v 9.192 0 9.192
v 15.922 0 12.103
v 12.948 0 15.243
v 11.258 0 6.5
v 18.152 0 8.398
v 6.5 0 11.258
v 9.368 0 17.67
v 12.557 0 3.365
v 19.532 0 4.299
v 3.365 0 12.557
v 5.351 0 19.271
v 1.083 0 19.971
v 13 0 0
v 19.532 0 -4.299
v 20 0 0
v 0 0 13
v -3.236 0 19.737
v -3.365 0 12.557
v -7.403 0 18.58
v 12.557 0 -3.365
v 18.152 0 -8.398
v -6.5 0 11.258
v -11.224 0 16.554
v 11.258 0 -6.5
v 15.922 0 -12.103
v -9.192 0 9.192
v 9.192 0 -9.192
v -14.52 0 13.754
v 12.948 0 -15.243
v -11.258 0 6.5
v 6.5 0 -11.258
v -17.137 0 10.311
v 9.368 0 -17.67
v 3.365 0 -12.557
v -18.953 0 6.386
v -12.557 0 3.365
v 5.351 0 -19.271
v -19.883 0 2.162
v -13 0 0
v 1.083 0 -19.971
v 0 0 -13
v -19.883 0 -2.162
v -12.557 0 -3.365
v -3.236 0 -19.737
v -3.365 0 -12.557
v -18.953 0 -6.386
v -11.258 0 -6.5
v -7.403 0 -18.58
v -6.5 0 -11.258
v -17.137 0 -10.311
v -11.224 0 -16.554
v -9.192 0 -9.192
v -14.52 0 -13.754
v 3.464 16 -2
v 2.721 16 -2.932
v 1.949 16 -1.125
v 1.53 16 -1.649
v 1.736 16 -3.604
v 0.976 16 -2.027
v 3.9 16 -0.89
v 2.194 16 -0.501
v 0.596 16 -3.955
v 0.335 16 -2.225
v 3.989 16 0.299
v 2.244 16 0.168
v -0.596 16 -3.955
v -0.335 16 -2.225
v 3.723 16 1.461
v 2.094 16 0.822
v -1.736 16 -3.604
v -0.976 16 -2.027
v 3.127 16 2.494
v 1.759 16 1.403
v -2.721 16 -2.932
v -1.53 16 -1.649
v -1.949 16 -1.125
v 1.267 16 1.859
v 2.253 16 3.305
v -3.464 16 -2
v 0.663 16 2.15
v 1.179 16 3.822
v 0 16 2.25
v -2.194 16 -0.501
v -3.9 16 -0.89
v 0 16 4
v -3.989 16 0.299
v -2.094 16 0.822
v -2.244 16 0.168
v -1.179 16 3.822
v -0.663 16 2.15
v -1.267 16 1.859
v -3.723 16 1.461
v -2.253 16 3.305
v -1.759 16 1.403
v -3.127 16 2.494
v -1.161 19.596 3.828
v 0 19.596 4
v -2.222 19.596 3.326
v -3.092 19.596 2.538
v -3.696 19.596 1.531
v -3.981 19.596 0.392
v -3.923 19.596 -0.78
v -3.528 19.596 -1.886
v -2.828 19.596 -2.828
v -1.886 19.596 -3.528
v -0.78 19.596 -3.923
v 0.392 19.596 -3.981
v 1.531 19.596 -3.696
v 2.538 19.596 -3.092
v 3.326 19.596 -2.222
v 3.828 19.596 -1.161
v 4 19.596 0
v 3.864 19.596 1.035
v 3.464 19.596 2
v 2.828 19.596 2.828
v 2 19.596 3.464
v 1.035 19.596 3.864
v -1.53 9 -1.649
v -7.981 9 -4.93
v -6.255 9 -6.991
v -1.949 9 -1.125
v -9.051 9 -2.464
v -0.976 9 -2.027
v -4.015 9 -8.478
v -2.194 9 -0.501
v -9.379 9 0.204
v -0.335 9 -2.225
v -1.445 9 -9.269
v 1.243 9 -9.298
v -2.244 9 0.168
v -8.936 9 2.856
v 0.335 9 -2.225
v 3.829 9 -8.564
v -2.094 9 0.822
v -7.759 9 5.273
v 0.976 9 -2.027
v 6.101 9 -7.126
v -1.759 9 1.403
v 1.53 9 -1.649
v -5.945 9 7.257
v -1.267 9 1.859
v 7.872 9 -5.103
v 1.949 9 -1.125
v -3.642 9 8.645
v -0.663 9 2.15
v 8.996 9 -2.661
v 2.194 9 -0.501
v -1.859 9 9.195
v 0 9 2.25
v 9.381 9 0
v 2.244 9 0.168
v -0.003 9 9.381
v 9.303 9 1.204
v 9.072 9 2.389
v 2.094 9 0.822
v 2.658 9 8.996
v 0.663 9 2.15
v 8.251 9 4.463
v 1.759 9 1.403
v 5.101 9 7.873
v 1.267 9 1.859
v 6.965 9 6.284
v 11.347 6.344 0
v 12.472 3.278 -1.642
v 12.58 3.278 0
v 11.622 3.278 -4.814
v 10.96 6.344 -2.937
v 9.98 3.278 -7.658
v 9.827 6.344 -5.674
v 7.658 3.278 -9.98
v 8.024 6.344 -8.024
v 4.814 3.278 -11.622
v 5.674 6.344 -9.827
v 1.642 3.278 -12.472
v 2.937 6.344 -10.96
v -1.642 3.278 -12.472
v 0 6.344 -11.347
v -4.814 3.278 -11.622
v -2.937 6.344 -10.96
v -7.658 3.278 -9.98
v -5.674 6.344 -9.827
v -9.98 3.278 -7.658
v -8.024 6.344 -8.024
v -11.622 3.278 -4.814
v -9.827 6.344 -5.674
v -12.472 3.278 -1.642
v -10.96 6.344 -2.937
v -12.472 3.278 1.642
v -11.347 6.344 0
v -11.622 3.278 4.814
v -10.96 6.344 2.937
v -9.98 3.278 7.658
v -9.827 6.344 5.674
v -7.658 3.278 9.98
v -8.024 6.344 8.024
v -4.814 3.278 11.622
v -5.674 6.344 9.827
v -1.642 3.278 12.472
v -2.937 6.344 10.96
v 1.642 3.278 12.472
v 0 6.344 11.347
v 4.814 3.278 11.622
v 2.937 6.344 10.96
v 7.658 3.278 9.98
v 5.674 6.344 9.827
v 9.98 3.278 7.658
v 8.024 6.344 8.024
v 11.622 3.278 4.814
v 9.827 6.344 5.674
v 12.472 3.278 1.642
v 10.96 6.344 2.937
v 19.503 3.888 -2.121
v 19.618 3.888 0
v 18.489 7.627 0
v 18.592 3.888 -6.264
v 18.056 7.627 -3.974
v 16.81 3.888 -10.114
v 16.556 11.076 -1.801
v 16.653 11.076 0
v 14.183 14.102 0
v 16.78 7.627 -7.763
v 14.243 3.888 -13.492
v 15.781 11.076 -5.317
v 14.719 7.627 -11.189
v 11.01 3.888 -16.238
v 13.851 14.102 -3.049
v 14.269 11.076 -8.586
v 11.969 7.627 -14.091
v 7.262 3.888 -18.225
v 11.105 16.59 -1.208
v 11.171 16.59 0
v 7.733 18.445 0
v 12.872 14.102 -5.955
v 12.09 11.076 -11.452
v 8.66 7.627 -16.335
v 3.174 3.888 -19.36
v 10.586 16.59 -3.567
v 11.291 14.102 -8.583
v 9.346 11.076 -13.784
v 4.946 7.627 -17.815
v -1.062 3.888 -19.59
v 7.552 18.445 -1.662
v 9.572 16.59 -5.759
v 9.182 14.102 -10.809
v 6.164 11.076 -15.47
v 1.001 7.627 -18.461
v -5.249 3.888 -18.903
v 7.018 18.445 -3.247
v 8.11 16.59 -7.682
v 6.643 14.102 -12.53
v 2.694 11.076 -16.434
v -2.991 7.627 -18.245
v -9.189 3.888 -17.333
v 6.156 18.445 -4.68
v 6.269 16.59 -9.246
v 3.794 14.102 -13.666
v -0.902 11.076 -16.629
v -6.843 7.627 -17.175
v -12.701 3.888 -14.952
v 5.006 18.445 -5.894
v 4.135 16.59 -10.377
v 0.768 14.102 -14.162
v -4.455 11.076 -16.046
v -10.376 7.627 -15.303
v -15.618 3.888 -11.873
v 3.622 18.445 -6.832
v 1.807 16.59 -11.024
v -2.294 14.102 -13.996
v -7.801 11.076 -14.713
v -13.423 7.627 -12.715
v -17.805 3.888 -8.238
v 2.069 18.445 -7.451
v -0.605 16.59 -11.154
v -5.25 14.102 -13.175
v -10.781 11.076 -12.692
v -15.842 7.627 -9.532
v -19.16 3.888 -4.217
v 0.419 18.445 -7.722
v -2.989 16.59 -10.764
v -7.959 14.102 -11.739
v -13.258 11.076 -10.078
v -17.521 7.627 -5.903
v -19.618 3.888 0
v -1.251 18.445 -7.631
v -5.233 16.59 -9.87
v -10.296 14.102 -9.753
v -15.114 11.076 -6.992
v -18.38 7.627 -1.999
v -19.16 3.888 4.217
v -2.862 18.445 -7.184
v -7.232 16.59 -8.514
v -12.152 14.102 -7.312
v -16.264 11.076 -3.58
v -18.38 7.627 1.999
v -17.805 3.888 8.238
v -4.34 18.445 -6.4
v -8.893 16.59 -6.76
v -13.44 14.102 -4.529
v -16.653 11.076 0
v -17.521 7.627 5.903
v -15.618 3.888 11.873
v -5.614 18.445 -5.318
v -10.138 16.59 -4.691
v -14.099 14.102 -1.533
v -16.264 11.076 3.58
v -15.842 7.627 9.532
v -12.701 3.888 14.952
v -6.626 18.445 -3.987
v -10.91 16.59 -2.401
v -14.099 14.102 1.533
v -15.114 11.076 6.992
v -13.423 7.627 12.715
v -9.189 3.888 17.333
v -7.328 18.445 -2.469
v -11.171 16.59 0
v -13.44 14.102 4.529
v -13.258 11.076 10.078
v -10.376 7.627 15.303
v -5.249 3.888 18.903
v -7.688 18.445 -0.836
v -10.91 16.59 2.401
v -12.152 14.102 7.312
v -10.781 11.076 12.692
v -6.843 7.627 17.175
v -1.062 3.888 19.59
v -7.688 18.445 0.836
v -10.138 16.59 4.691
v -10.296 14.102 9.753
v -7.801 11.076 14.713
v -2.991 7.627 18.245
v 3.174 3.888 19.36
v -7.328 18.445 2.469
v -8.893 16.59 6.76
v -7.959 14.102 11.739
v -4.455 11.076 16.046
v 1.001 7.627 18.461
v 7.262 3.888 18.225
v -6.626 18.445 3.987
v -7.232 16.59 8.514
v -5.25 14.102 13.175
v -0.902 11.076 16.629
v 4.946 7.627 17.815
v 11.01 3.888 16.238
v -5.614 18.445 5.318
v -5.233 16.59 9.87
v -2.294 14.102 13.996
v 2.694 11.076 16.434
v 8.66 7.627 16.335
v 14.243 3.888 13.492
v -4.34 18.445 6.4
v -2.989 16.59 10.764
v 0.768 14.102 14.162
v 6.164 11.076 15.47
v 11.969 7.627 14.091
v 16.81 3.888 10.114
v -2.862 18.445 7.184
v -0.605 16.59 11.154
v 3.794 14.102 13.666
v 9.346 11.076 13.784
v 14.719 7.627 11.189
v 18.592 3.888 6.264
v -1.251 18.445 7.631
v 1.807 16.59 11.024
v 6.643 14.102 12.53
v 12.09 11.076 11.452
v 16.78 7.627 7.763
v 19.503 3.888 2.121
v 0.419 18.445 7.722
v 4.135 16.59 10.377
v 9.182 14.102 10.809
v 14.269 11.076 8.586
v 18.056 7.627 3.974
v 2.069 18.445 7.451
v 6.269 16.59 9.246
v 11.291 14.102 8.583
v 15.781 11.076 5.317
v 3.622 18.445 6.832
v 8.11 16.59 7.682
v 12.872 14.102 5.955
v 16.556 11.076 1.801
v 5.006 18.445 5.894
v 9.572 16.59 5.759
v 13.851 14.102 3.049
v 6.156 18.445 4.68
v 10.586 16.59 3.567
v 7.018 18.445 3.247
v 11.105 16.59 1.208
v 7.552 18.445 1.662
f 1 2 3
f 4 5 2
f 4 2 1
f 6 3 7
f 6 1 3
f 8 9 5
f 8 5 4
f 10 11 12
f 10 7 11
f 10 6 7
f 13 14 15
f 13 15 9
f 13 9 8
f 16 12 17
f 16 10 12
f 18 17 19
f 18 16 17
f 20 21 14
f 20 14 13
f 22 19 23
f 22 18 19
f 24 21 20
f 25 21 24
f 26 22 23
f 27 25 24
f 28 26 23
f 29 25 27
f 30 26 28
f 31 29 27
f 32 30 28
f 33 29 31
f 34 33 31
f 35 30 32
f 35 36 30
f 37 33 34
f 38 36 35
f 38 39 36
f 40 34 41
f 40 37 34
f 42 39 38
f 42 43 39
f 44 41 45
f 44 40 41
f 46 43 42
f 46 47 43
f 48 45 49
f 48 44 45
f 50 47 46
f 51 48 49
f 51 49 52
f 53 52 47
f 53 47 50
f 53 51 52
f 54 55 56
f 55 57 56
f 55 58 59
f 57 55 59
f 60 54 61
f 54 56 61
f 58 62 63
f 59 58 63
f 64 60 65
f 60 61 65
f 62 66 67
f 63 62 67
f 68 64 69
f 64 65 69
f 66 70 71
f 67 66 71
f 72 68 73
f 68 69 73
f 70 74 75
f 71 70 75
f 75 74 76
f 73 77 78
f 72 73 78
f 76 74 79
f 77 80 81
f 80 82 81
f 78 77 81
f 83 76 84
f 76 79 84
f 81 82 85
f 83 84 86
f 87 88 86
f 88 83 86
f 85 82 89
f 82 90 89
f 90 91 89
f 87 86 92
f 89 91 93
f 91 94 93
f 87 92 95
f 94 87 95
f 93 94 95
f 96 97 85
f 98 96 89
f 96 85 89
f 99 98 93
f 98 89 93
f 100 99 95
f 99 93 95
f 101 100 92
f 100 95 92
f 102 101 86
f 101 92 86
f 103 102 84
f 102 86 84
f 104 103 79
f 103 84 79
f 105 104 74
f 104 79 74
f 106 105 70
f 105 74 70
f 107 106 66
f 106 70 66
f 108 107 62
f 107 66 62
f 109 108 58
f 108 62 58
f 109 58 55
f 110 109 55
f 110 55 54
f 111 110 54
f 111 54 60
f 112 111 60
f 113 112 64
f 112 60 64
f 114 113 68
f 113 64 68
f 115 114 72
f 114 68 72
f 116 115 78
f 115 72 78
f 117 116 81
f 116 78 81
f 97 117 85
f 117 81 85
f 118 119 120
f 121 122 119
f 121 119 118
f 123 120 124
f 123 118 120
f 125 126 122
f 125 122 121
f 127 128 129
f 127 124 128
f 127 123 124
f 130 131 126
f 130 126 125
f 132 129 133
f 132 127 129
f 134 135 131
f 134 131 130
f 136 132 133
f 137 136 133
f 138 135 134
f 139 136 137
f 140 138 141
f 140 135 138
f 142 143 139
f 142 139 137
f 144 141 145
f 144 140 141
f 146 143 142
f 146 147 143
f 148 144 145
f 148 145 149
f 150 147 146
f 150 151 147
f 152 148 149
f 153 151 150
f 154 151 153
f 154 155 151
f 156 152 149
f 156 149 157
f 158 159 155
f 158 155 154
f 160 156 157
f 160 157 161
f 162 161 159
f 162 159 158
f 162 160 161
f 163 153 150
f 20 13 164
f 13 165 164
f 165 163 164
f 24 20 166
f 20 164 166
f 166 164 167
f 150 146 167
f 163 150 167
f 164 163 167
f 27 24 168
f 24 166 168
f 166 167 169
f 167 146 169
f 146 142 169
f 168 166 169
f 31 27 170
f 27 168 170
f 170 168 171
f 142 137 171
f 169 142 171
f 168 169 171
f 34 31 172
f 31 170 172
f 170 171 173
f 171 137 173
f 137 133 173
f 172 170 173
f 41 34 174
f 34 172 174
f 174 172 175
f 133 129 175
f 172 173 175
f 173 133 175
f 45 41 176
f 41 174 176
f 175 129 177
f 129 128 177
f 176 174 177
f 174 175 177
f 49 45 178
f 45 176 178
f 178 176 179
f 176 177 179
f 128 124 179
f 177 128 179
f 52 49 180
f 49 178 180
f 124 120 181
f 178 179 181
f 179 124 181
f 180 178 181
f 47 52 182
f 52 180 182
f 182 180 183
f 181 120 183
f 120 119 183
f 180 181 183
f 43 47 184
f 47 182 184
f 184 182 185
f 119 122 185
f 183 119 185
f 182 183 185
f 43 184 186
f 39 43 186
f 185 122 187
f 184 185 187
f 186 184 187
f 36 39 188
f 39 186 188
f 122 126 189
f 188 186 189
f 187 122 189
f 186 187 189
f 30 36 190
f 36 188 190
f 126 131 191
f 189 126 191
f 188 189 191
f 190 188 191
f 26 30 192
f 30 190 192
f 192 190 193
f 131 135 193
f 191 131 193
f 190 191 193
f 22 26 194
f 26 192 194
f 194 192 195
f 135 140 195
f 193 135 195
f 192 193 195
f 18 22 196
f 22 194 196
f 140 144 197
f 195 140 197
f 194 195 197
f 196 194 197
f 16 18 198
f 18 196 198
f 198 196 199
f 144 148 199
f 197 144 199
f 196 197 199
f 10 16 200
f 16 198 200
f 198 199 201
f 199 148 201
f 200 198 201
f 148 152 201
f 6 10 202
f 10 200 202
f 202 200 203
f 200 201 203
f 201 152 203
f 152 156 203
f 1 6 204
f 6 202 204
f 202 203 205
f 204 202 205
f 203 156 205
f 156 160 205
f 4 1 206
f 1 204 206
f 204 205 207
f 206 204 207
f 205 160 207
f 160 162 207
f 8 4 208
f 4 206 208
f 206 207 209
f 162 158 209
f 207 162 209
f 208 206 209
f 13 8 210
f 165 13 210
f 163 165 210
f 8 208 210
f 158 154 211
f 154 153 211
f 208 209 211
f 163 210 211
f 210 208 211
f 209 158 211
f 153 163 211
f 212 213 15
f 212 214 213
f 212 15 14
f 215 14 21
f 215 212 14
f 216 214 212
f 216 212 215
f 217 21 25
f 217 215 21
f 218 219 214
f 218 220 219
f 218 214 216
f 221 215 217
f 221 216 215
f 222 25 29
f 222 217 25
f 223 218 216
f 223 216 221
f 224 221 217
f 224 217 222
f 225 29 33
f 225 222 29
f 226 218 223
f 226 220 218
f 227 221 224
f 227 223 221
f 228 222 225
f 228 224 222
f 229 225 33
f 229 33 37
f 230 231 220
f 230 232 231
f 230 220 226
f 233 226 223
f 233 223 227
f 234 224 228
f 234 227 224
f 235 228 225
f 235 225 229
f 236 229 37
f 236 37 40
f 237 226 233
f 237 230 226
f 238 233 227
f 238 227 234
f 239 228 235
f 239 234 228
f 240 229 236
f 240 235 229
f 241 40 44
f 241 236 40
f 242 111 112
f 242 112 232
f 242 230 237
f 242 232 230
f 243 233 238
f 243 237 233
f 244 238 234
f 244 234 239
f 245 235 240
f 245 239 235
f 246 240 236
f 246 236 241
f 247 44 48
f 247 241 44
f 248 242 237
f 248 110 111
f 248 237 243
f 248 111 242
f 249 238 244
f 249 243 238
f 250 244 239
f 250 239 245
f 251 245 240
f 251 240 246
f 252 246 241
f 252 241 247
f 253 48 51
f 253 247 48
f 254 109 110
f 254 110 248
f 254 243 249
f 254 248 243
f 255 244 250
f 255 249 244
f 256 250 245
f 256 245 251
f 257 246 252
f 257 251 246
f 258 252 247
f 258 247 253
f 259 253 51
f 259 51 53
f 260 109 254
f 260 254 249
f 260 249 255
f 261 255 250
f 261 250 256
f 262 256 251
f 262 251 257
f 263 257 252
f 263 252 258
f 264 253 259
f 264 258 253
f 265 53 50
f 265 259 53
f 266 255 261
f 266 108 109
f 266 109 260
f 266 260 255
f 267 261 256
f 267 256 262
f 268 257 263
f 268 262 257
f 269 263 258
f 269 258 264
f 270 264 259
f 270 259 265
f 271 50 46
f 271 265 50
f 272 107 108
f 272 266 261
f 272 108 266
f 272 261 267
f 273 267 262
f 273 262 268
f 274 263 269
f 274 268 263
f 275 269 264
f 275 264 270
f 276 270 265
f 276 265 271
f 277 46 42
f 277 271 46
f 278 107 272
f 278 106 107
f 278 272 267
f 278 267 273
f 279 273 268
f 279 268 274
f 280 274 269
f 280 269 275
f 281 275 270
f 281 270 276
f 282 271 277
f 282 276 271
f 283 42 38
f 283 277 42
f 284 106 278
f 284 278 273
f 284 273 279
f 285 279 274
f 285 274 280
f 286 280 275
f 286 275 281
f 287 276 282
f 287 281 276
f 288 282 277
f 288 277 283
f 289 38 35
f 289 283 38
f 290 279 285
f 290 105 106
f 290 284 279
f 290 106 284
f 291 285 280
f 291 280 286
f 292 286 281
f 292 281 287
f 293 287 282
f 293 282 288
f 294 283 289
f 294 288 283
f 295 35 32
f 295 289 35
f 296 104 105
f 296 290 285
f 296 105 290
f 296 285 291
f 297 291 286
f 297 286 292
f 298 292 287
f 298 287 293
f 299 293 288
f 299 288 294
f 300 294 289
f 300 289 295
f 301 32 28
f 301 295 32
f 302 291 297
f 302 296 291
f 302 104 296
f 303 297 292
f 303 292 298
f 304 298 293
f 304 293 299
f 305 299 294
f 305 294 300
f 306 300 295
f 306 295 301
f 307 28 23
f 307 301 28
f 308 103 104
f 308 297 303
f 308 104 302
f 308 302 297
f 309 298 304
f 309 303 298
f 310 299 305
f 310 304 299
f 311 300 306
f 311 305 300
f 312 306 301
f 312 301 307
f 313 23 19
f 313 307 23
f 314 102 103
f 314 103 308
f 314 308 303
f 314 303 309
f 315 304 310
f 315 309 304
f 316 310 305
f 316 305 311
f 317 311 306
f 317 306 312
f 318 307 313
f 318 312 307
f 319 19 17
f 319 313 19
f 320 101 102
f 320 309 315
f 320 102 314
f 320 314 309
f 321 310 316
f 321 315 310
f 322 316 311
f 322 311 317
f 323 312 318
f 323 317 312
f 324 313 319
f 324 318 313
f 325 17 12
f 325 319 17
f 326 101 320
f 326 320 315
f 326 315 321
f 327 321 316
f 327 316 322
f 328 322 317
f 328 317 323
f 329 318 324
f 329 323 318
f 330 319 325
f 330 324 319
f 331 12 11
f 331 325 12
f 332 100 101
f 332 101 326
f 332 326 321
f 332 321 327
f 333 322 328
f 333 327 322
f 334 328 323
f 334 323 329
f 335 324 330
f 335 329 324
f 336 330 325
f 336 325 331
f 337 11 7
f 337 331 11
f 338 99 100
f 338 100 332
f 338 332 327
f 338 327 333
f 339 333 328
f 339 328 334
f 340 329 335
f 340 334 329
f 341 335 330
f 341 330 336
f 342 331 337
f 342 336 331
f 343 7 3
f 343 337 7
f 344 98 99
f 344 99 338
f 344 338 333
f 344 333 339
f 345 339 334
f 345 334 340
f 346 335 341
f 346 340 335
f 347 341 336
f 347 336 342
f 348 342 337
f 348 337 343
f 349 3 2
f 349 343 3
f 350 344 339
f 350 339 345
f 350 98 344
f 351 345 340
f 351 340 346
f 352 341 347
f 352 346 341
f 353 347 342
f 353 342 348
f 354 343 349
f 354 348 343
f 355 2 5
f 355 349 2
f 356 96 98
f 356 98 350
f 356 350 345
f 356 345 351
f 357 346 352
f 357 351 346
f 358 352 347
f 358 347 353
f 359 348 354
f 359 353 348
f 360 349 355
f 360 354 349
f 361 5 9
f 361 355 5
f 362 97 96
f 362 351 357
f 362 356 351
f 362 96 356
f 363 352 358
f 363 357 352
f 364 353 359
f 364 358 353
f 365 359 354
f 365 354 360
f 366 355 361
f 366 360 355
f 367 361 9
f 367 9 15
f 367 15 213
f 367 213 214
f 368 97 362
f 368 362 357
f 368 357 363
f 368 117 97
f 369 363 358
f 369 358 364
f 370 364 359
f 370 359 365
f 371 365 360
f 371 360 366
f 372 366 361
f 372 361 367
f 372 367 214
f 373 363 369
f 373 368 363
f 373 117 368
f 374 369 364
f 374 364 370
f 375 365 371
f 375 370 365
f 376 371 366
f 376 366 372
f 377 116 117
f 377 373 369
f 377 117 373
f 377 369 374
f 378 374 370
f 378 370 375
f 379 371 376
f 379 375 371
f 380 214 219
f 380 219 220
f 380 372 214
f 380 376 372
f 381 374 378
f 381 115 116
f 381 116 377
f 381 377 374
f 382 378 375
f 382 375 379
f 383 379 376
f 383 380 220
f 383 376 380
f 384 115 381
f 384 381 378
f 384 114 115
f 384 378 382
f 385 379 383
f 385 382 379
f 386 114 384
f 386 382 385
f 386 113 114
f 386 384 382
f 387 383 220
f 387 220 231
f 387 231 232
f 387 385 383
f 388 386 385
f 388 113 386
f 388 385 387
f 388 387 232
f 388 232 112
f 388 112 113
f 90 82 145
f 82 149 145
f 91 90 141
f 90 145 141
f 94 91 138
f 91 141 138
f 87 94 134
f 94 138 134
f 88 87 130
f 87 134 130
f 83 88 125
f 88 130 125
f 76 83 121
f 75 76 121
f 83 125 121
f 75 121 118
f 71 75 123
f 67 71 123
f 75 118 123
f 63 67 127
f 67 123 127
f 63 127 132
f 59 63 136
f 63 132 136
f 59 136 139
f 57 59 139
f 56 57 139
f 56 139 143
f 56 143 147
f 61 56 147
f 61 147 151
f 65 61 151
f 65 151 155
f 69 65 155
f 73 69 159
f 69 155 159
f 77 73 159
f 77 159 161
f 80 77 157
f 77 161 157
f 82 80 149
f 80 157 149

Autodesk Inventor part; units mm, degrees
ref_plane "YZ Plane" through (0, 0, 0) normal (1, 0, 0) x (0, 1, 0)
ref_plane "XY Plane" through (0, 0, 0) normal (0, 0, 1) x (1, 0, 0)
sketch "Sketch1" plane through (0, 0, 0) normal (0, 0, 1) x (1, 0, 0)
  line L0 (0, 0) -> (0, 20)
  line L1 (0, 0) -> (20, 0)
  arc A0 (20, 0) -> (0, 20) centre (0, 0) ccw
  line L2 (0, -4.8284) -> (0, 28.9706) projected
  dimension "d2" = 20
revolve "Revolution1" add sketch "Sketch1" angle 360 about axis through (0, -10, 0) along (0, 1, 0)
ref_plane "Work Plane1" through (0, 20, 0) normal (0, 1, 0) x (-1, 0, 0)
sketch "Sketch2" plane through (0, 20, 0) normal (0, 1, 0) x (-1, 0, 0)
  point P0 (0, 0)
  point P1 (0, 0)
hole "Hole1" at (0, 20, 0) direction (0, -1, 0) diameter 4.5 end through all counterbore diameter 8 counterbore depth 4 clearance for "Socket Head Cap Screw" size "M4" standard "Ansi Metric M Profile"
shell "Shell1" thickness 7 removed faces 1 at (13.8841, 0, 1.6858)
sketch "Sketch3" plane through (0, 0, 0) normal (0, -1, 0) x (1, 0, 0)
  circle A0 centre (0, 0) radius 9.25 projected
  circle A1 centre (0, 0) radius 2.25 projected
extrude "Extrusion1" cut sketch "Sketch3" against normal up to surface (9 mm away)
properties part number "Ball_Upper Half" material "Nylon 6/6"
